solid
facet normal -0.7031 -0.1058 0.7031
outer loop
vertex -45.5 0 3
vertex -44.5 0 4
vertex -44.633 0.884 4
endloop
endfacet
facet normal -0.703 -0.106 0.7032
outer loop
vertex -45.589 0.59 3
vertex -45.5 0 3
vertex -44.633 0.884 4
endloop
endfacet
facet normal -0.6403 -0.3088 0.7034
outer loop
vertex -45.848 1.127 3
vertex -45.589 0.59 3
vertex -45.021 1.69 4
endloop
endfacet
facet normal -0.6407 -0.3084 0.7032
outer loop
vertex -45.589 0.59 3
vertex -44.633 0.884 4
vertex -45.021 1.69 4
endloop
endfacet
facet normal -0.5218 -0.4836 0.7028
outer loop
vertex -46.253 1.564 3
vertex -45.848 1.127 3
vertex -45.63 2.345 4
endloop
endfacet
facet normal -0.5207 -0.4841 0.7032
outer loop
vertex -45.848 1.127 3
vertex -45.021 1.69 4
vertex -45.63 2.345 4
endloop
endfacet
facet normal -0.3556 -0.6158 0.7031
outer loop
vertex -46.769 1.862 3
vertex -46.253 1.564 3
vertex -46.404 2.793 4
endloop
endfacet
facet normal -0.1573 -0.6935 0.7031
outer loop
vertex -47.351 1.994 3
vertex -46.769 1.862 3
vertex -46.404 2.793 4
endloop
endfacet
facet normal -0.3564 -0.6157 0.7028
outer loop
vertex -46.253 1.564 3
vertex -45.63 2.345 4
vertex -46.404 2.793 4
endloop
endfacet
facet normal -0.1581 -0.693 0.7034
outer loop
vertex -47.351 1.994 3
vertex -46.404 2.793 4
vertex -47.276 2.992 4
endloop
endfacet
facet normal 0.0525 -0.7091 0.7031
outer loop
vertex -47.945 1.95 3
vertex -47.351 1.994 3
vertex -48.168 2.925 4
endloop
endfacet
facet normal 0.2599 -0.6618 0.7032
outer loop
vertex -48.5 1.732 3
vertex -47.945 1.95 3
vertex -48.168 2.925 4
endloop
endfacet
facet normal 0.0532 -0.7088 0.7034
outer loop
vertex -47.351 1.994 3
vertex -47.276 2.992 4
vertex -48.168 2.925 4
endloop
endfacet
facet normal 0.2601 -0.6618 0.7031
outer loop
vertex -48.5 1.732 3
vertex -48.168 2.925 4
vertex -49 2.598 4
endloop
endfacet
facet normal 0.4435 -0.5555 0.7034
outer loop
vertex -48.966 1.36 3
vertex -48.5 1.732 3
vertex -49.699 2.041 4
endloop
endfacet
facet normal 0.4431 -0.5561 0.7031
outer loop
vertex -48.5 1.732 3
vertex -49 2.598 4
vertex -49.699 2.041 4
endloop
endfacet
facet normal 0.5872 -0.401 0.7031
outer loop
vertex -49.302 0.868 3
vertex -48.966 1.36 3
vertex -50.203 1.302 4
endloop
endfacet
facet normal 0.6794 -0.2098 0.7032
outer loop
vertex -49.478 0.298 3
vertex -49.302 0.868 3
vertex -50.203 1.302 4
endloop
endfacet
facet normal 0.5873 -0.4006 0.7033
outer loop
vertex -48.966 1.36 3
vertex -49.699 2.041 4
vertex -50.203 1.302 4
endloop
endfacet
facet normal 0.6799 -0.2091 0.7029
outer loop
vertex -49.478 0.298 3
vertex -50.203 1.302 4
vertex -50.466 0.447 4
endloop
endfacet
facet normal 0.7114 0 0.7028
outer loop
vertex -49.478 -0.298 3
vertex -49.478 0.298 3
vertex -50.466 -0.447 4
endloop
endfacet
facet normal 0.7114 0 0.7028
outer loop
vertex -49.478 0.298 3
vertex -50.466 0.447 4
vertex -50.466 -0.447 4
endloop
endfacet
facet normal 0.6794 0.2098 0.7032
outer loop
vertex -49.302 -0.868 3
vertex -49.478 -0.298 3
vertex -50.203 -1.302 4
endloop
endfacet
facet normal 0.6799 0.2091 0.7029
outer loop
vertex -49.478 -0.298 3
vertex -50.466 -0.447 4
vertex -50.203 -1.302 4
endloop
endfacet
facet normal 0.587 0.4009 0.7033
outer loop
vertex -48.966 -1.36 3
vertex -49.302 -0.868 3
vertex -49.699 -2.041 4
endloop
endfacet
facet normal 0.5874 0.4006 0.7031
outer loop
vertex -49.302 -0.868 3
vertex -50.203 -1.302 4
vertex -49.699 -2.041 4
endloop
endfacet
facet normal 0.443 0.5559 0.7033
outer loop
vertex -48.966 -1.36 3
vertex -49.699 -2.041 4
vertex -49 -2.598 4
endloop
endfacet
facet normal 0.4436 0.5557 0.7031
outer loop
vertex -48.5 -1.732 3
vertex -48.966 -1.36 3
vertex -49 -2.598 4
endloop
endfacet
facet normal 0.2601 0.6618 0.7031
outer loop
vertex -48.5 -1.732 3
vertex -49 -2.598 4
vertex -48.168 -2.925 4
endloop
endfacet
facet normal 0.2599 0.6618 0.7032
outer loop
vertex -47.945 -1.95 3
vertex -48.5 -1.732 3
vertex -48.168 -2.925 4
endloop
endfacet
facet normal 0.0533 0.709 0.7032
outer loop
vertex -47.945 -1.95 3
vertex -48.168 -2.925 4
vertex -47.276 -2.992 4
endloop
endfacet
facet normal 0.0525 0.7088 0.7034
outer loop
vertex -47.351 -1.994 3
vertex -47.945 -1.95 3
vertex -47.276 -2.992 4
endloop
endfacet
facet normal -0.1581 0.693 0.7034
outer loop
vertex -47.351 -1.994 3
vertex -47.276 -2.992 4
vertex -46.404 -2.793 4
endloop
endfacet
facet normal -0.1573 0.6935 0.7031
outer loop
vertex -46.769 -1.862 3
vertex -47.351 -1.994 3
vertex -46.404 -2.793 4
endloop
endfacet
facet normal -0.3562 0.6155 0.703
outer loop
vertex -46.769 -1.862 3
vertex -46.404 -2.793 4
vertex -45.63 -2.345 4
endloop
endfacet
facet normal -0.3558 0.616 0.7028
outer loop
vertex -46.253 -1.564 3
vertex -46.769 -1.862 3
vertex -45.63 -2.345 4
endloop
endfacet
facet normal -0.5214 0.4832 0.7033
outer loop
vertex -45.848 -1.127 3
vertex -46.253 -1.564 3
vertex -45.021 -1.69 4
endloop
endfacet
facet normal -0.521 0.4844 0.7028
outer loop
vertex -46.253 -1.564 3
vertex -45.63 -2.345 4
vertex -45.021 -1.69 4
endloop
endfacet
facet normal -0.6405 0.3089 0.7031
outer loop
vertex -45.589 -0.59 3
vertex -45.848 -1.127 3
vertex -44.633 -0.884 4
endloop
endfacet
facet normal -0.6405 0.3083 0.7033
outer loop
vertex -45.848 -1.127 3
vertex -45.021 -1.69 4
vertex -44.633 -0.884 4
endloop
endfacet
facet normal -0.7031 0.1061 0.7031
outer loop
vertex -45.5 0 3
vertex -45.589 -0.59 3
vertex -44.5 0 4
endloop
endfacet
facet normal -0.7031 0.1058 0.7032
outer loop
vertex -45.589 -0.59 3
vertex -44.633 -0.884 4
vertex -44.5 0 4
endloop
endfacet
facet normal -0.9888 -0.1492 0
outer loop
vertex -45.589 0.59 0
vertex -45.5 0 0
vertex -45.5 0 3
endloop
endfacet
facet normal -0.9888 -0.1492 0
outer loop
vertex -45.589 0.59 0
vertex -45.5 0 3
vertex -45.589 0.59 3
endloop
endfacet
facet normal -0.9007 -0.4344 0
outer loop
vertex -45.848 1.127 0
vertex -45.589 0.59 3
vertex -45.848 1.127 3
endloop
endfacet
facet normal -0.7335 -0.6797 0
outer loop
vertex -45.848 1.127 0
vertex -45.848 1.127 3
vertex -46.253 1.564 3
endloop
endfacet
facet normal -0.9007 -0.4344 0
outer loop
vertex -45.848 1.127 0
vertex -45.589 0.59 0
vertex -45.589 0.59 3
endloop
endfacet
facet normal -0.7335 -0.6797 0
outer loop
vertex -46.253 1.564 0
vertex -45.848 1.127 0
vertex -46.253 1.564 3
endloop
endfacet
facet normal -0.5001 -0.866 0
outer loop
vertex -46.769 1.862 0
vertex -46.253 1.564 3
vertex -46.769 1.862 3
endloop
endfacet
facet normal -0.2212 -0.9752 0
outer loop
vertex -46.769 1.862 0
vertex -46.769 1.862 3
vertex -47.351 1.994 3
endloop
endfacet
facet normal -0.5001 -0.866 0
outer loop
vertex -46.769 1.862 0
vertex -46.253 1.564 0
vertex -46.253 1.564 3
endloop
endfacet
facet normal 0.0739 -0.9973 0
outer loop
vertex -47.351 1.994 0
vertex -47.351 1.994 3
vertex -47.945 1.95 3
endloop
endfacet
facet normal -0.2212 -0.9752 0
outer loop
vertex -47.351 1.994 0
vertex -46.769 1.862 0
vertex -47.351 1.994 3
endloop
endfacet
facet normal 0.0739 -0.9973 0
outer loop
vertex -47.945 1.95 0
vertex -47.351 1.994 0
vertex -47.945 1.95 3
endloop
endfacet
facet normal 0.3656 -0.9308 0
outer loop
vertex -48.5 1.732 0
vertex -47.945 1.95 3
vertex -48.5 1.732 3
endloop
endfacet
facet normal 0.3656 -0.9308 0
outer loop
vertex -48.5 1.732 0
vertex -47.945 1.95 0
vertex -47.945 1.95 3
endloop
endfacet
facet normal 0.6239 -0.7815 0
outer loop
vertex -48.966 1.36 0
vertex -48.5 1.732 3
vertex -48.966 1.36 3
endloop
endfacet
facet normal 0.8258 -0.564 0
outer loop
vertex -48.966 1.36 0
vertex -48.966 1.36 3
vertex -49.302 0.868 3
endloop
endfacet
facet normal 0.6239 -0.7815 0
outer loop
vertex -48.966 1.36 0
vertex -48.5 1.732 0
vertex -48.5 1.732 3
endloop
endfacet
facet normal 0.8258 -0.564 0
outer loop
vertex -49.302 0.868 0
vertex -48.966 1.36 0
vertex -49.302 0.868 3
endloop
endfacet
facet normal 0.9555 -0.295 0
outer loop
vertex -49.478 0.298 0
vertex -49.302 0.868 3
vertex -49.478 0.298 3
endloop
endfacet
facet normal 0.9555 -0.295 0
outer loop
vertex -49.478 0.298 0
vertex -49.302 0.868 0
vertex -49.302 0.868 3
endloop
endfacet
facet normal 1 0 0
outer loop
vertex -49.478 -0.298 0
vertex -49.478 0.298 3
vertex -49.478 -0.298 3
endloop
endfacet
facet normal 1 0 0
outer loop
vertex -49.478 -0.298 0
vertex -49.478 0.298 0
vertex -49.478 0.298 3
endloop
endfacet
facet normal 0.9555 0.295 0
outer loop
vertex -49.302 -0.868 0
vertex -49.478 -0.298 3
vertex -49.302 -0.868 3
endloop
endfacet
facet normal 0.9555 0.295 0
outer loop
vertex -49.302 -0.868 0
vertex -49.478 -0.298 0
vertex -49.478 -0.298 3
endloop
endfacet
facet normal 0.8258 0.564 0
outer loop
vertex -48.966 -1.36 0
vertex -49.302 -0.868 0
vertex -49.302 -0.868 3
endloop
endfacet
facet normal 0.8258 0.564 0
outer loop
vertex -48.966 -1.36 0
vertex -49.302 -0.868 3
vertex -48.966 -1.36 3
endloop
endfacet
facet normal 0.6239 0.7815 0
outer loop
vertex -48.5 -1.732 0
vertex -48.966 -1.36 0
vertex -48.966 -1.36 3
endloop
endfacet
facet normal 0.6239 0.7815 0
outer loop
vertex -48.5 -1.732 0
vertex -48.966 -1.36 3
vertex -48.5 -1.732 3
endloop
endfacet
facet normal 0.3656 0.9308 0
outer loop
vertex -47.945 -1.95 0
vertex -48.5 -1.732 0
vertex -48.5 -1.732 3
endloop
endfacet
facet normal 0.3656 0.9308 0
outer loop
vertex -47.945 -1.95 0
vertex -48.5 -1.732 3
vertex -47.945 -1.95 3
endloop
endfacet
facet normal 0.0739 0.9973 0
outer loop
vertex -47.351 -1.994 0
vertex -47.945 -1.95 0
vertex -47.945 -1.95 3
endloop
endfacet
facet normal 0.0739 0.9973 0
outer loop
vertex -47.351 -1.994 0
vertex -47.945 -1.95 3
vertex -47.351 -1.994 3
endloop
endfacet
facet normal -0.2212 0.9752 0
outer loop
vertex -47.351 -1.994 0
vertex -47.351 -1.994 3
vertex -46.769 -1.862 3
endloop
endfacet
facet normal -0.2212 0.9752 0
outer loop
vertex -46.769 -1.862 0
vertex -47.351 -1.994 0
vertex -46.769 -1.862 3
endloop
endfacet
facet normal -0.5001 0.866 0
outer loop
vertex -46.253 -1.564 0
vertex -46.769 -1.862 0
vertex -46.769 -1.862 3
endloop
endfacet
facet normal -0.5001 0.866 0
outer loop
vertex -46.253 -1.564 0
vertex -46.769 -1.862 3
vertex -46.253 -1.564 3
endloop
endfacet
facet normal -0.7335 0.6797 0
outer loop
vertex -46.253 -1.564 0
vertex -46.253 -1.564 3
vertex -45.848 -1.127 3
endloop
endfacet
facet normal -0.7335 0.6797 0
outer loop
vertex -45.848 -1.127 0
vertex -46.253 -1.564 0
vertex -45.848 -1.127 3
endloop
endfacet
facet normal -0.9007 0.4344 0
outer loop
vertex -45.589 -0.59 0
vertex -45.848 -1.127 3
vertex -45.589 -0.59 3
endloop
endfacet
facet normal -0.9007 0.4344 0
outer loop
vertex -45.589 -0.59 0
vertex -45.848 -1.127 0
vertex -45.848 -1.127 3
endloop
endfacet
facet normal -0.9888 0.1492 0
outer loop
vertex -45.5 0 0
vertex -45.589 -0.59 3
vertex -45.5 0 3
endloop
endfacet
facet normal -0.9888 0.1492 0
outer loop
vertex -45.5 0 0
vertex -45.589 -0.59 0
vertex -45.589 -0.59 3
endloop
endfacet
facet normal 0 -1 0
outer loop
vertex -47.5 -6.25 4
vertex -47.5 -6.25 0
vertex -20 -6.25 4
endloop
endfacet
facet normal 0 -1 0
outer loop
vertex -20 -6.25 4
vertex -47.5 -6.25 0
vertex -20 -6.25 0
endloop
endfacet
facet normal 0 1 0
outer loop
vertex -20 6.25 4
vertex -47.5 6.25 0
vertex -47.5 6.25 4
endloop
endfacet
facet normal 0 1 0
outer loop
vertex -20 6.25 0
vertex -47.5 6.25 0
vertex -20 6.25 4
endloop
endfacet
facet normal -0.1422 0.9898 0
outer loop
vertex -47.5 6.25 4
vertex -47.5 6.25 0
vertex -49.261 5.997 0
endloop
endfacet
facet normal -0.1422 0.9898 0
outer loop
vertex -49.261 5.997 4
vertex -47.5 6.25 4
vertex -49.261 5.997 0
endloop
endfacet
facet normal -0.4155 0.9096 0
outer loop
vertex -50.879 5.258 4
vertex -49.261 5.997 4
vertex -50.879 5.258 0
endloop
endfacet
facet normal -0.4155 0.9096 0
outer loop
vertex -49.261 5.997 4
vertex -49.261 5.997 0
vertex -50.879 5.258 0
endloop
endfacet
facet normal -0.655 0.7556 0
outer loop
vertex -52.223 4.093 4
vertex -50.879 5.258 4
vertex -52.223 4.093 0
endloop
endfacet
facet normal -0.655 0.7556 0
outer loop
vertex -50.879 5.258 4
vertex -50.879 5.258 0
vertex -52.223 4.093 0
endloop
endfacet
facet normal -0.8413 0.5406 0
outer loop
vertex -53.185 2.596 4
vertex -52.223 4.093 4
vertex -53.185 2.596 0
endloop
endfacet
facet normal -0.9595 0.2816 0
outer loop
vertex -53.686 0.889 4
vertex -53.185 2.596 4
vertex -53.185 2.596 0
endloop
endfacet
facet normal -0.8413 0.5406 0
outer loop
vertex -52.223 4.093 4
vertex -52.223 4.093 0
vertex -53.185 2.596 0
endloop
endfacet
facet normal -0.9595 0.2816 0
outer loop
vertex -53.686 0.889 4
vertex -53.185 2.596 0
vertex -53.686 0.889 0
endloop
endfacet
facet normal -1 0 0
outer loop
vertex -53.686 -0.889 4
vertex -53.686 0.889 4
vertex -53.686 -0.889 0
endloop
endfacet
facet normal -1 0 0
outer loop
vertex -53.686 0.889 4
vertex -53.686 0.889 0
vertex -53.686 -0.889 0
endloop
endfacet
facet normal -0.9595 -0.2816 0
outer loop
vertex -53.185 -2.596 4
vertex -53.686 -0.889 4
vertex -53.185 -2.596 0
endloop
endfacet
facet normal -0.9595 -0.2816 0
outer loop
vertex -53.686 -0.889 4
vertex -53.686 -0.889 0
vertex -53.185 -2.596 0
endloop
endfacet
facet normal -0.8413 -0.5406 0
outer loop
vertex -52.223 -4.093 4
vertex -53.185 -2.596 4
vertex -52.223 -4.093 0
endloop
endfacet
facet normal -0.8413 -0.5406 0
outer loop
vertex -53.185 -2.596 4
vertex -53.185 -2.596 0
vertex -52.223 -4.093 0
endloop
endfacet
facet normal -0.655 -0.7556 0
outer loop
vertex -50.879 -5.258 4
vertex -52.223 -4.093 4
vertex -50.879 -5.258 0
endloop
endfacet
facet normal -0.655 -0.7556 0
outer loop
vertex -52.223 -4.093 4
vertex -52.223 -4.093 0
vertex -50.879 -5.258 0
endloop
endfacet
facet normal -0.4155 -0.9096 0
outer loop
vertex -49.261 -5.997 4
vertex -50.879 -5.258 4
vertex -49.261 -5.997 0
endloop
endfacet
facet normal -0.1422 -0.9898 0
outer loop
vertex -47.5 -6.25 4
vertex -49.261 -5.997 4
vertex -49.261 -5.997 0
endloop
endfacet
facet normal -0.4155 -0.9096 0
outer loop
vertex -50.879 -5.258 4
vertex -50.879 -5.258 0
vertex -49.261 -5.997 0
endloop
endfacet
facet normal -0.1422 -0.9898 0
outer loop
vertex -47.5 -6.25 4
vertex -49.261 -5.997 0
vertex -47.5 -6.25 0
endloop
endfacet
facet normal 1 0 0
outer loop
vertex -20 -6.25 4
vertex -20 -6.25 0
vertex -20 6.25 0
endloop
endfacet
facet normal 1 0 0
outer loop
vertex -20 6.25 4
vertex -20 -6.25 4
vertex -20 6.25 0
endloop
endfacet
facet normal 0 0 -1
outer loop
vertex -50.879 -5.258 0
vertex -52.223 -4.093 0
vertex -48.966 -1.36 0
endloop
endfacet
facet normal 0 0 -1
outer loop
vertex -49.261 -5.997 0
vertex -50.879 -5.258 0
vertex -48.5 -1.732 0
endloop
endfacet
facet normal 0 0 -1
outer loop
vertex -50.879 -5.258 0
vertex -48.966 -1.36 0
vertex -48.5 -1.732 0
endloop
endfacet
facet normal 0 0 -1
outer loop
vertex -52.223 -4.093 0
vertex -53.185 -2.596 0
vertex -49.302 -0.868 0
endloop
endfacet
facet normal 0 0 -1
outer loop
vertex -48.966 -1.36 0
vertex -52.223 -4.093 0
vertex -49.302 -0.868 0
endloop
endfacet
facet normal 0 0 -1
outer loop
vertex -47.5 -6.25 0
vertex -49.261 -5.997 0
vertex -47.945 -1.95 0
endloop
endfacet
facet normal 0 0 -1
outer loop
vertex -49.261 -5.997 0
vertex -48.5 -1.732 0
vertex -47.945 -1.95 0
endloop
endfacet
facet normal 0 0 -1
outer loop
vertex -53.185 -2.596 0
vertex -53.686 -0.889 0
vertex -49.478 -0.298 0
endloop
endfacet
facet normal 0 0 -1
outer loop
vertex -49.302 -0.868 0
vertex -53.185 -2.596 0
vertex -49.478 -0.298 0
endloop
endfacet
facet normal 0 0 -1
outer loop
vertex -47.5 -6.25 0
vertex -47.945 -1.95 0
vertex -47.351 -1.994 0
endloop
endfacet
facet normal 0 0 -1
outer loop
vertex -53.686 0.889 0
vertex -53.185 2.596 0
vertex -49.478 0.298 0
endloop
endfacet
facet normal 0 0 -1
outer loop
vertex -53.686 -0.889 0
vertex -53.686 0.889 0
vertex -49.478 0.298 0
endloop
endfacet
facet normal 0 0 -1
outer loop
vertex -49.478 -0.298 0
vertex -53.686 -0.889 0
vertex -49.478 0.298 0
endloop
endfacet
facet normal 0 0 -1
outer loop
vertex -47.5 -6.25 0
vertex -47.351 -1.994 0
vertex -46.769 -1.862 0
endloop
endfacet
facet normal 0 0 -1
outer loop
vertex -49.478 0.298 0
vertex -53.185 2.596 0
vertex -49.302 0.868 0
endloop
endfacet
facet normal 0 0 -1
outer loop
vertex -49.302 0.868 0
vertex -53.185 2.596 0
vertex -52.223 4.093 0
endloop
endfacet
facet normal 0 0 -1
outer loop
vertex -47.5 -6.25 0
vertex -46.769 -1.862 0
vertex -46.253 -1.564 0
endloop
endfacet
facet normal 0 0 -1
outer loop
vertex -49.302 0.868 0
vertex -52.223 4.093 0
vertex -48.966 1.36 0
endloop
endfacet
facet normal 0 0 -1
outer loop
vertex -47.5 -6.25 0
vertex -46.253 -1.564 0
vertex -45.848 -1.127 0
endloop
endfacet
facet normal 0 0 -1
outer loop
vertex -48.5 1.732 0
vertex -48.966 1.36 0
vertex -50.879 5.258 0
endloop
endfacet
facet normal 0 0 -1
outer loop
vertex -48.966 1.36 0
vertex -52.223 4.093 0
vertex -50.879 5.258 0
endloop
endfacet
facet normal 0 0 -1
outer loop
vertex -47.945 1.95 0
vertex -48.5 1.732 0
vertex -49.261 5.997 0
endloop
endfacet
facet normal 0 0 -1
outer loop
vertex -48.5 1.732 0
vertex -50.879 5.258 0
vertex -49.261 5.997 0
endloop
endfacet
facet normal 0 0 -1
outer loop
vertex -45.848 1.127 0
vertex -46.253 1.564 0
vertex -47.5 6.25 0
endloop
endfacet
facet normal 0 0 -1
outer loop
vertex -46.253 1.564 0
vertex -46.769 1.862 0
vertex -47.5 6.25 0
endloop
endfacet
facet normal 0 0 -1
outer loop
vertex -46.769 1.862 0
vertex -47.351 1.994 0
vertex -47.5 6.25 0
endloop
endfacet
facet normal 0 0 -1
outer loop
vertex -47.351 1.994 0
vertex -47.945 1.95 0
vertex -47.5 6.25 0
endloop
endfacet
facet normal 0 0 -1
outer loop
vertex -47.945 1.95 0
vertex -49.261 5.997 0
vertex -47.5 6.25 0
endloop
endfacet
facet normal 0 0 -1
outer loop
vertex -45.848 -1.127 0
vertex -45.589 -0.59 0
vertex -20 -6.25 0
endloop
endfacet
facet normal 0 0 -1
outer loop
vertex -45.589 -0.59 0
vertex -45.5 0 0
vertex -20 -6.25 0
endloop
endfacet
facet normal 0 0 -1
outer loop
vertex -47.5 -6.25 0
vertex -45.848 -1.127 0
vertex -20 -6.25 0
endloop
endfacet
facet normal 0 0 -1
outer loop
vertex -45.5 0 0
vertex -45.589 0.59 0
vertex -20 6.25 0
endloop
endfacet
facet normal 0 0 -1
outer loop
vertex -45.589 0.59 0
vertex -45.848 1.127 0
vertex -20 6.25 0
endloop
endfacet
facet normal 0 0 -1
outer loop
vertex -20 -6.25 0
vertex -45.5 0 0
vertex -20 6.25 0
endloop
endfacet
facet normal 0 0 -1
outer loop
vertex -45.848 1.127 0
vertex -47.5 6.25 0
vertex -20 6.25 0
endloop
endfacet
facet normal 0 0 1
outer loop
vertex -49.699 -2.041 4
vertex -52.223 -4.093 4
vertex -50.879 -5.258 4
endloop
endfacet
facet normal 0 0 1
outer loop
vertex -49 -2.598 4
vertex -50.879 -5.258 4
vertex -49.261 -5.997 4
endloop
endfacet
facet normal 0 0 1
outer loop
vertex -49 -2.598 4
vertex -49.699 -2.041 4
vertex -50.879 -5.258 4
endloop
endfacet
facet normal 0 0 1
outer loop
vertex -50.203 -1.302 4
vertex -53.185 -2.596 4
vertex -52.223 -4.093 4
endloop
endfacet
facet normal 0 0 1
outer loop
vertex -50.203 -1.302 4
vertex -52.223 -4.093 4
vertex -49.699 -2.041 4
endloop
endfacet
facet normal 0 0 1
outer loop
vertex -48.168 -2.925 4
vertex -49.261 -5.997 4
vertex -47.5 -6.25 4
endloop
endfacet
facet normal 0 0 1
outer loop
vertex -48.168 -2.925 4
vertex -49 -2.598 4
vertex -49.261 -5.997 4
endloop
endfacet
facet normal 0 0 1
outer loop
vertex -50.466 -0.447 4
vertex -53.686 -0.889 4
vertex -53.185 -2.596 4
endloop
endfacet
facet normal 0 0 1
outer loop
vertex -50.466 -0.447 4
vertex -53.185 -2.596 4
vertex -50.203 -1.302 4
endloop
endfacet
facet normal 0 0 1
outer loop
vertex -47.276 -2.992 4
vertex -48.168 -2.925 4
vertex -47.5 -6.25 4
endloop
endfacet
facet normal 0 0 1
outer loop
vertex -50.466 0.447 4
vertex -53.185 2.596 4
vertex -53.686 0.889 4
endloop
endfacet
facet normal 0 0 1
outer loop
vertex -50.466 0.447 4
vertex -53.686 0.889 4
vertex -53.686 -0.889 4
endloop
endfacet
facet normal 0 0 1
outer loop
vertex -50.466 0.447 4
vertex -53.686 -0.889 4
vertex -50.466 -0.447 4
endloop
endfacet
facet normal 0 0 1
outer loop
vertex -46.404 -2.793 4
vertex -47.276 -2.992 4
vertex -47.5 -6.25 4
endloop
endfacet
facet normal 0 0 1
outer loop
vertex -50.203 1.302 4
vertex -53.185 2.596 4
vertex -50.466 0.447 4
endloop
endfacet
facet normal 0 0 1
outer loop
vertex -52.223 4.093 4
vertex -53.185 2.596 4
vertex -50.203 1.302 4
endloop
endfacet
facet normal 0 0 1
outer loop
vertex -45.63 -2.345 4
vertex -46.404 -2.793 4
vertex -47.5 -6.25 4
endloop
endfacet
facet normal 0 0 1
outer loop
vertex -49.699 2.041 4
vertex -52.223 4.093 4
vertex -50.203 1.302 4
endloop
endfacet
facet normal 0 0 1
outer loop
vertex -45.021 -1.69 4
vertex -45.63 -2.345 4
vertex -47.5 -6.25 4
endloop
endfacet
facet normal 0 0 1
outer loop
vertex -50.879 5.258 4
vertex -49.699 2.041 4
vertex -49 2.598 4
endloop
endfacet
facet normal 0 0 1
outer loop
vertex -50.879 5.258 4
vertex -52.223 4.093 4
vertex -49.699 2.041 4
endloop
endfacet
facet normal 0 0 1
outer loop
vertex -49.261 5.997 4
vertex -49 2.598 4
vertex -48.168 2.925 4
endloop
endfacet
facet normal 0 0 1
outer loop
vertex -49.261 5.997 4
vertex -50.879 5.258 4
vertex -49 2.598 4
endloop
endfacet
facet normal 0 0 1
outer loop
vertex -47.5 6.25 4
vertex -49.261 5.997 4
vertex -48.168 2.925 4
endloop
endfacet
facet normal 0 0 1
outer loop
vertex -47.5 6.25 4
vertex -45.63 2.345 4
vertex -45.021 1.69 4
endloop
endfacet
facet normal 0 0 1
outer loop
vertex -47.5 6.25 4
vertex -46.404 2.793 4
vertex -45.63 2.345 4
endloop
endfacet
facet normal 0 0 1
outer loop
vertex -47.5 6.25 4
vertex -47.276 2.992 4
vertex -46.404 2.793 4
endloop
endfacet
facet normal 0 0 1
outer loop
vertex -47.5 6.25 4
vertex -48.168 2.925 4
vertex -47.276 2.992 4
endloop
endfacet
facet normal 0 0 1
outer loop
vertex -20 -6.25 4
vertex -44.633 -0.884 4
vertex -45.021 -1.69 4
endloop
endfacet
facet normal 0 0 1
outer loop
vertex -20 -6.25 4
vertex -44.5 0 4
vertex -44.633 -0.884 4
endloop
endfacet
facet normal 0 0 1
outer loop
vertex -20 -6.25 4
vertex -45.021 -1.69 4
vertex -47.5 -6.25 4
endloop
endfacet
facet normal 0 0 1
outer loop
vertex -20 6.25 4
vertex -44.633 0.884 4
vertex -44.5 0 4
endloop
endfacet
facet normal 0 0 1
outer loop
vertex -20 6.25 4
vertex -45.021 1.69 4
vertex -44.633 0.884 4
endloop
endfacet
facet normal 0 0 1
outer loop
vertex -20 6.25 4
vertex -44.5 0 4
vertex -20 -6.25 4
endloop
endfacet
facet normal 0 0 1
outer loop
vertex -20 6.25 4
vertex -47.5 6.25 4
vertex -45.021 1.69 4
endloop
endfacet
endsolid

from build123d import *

# Parameters (mm, degrees)
CYLINDER004_R     = 2
CYLINDER004_DEPTH = 4
BOX006_W          = 27.5
BOX006_H          = 12.5
BOX006_DEPTH      = 4
TUBE001_R         = 6.25
TUBE001_DEPTH     = 4
CHAMFER_SIZE      = 1


with BuildPart() as toeinner001:
    # Cylinder004 → Cylinder004 (new body)
    with BuildSketch(Plane(origin=(-47.5, 0, 0), x_dir=(1, 0, 0), z_dir=(0, 0, 1))):
        Circle(CYLINDER004_R)
    extrude(amount=CYLINDER004_DEPTH)


with BuildPart() as arm001:
    # Box006 → Box006 (new body)
    with BuildSketch(Plane(origin=(-47.5, -6.25, 0), x_dir=(1, 0, 0), z_dir=(0, 0, 1))):
        with Locations((13.75, 6.25)):
            Rectangle(BOX006_W, BOX006_H)
    extrude(amount=BOX006_DEPTH)


with BuildPart() as chamfer_body:
    # Tube001 → Tube001 (new body)
    with BuildSketch(Plane(origin=(-47.5, 0, 0), x_dir=(1, 0, 0), z_dir=(0, 0, 1))):
        Circle(TUBE001_R)
    extrude(amount=TUBE001_DEPTH)

    # Fusion001: union Arm001
    add(arm001.part)

    # Cut001: cut ToeInner001
    add(toeinner001.part, mode=Mode.SUBTRACT)

    # Chamfer
    chamfer_edges = [chamfer_body.edges().sort_by_distance(p)[0] for p in [
        (-46.085786, 1.414214, 4),
        (-49.5, 0, 4),
        (-46.085786, -1.414214, 4),
    ]]
    chamfer(chamfer_edges, length=CHAMFER_SIZE)


solid = chamfer_body.part
